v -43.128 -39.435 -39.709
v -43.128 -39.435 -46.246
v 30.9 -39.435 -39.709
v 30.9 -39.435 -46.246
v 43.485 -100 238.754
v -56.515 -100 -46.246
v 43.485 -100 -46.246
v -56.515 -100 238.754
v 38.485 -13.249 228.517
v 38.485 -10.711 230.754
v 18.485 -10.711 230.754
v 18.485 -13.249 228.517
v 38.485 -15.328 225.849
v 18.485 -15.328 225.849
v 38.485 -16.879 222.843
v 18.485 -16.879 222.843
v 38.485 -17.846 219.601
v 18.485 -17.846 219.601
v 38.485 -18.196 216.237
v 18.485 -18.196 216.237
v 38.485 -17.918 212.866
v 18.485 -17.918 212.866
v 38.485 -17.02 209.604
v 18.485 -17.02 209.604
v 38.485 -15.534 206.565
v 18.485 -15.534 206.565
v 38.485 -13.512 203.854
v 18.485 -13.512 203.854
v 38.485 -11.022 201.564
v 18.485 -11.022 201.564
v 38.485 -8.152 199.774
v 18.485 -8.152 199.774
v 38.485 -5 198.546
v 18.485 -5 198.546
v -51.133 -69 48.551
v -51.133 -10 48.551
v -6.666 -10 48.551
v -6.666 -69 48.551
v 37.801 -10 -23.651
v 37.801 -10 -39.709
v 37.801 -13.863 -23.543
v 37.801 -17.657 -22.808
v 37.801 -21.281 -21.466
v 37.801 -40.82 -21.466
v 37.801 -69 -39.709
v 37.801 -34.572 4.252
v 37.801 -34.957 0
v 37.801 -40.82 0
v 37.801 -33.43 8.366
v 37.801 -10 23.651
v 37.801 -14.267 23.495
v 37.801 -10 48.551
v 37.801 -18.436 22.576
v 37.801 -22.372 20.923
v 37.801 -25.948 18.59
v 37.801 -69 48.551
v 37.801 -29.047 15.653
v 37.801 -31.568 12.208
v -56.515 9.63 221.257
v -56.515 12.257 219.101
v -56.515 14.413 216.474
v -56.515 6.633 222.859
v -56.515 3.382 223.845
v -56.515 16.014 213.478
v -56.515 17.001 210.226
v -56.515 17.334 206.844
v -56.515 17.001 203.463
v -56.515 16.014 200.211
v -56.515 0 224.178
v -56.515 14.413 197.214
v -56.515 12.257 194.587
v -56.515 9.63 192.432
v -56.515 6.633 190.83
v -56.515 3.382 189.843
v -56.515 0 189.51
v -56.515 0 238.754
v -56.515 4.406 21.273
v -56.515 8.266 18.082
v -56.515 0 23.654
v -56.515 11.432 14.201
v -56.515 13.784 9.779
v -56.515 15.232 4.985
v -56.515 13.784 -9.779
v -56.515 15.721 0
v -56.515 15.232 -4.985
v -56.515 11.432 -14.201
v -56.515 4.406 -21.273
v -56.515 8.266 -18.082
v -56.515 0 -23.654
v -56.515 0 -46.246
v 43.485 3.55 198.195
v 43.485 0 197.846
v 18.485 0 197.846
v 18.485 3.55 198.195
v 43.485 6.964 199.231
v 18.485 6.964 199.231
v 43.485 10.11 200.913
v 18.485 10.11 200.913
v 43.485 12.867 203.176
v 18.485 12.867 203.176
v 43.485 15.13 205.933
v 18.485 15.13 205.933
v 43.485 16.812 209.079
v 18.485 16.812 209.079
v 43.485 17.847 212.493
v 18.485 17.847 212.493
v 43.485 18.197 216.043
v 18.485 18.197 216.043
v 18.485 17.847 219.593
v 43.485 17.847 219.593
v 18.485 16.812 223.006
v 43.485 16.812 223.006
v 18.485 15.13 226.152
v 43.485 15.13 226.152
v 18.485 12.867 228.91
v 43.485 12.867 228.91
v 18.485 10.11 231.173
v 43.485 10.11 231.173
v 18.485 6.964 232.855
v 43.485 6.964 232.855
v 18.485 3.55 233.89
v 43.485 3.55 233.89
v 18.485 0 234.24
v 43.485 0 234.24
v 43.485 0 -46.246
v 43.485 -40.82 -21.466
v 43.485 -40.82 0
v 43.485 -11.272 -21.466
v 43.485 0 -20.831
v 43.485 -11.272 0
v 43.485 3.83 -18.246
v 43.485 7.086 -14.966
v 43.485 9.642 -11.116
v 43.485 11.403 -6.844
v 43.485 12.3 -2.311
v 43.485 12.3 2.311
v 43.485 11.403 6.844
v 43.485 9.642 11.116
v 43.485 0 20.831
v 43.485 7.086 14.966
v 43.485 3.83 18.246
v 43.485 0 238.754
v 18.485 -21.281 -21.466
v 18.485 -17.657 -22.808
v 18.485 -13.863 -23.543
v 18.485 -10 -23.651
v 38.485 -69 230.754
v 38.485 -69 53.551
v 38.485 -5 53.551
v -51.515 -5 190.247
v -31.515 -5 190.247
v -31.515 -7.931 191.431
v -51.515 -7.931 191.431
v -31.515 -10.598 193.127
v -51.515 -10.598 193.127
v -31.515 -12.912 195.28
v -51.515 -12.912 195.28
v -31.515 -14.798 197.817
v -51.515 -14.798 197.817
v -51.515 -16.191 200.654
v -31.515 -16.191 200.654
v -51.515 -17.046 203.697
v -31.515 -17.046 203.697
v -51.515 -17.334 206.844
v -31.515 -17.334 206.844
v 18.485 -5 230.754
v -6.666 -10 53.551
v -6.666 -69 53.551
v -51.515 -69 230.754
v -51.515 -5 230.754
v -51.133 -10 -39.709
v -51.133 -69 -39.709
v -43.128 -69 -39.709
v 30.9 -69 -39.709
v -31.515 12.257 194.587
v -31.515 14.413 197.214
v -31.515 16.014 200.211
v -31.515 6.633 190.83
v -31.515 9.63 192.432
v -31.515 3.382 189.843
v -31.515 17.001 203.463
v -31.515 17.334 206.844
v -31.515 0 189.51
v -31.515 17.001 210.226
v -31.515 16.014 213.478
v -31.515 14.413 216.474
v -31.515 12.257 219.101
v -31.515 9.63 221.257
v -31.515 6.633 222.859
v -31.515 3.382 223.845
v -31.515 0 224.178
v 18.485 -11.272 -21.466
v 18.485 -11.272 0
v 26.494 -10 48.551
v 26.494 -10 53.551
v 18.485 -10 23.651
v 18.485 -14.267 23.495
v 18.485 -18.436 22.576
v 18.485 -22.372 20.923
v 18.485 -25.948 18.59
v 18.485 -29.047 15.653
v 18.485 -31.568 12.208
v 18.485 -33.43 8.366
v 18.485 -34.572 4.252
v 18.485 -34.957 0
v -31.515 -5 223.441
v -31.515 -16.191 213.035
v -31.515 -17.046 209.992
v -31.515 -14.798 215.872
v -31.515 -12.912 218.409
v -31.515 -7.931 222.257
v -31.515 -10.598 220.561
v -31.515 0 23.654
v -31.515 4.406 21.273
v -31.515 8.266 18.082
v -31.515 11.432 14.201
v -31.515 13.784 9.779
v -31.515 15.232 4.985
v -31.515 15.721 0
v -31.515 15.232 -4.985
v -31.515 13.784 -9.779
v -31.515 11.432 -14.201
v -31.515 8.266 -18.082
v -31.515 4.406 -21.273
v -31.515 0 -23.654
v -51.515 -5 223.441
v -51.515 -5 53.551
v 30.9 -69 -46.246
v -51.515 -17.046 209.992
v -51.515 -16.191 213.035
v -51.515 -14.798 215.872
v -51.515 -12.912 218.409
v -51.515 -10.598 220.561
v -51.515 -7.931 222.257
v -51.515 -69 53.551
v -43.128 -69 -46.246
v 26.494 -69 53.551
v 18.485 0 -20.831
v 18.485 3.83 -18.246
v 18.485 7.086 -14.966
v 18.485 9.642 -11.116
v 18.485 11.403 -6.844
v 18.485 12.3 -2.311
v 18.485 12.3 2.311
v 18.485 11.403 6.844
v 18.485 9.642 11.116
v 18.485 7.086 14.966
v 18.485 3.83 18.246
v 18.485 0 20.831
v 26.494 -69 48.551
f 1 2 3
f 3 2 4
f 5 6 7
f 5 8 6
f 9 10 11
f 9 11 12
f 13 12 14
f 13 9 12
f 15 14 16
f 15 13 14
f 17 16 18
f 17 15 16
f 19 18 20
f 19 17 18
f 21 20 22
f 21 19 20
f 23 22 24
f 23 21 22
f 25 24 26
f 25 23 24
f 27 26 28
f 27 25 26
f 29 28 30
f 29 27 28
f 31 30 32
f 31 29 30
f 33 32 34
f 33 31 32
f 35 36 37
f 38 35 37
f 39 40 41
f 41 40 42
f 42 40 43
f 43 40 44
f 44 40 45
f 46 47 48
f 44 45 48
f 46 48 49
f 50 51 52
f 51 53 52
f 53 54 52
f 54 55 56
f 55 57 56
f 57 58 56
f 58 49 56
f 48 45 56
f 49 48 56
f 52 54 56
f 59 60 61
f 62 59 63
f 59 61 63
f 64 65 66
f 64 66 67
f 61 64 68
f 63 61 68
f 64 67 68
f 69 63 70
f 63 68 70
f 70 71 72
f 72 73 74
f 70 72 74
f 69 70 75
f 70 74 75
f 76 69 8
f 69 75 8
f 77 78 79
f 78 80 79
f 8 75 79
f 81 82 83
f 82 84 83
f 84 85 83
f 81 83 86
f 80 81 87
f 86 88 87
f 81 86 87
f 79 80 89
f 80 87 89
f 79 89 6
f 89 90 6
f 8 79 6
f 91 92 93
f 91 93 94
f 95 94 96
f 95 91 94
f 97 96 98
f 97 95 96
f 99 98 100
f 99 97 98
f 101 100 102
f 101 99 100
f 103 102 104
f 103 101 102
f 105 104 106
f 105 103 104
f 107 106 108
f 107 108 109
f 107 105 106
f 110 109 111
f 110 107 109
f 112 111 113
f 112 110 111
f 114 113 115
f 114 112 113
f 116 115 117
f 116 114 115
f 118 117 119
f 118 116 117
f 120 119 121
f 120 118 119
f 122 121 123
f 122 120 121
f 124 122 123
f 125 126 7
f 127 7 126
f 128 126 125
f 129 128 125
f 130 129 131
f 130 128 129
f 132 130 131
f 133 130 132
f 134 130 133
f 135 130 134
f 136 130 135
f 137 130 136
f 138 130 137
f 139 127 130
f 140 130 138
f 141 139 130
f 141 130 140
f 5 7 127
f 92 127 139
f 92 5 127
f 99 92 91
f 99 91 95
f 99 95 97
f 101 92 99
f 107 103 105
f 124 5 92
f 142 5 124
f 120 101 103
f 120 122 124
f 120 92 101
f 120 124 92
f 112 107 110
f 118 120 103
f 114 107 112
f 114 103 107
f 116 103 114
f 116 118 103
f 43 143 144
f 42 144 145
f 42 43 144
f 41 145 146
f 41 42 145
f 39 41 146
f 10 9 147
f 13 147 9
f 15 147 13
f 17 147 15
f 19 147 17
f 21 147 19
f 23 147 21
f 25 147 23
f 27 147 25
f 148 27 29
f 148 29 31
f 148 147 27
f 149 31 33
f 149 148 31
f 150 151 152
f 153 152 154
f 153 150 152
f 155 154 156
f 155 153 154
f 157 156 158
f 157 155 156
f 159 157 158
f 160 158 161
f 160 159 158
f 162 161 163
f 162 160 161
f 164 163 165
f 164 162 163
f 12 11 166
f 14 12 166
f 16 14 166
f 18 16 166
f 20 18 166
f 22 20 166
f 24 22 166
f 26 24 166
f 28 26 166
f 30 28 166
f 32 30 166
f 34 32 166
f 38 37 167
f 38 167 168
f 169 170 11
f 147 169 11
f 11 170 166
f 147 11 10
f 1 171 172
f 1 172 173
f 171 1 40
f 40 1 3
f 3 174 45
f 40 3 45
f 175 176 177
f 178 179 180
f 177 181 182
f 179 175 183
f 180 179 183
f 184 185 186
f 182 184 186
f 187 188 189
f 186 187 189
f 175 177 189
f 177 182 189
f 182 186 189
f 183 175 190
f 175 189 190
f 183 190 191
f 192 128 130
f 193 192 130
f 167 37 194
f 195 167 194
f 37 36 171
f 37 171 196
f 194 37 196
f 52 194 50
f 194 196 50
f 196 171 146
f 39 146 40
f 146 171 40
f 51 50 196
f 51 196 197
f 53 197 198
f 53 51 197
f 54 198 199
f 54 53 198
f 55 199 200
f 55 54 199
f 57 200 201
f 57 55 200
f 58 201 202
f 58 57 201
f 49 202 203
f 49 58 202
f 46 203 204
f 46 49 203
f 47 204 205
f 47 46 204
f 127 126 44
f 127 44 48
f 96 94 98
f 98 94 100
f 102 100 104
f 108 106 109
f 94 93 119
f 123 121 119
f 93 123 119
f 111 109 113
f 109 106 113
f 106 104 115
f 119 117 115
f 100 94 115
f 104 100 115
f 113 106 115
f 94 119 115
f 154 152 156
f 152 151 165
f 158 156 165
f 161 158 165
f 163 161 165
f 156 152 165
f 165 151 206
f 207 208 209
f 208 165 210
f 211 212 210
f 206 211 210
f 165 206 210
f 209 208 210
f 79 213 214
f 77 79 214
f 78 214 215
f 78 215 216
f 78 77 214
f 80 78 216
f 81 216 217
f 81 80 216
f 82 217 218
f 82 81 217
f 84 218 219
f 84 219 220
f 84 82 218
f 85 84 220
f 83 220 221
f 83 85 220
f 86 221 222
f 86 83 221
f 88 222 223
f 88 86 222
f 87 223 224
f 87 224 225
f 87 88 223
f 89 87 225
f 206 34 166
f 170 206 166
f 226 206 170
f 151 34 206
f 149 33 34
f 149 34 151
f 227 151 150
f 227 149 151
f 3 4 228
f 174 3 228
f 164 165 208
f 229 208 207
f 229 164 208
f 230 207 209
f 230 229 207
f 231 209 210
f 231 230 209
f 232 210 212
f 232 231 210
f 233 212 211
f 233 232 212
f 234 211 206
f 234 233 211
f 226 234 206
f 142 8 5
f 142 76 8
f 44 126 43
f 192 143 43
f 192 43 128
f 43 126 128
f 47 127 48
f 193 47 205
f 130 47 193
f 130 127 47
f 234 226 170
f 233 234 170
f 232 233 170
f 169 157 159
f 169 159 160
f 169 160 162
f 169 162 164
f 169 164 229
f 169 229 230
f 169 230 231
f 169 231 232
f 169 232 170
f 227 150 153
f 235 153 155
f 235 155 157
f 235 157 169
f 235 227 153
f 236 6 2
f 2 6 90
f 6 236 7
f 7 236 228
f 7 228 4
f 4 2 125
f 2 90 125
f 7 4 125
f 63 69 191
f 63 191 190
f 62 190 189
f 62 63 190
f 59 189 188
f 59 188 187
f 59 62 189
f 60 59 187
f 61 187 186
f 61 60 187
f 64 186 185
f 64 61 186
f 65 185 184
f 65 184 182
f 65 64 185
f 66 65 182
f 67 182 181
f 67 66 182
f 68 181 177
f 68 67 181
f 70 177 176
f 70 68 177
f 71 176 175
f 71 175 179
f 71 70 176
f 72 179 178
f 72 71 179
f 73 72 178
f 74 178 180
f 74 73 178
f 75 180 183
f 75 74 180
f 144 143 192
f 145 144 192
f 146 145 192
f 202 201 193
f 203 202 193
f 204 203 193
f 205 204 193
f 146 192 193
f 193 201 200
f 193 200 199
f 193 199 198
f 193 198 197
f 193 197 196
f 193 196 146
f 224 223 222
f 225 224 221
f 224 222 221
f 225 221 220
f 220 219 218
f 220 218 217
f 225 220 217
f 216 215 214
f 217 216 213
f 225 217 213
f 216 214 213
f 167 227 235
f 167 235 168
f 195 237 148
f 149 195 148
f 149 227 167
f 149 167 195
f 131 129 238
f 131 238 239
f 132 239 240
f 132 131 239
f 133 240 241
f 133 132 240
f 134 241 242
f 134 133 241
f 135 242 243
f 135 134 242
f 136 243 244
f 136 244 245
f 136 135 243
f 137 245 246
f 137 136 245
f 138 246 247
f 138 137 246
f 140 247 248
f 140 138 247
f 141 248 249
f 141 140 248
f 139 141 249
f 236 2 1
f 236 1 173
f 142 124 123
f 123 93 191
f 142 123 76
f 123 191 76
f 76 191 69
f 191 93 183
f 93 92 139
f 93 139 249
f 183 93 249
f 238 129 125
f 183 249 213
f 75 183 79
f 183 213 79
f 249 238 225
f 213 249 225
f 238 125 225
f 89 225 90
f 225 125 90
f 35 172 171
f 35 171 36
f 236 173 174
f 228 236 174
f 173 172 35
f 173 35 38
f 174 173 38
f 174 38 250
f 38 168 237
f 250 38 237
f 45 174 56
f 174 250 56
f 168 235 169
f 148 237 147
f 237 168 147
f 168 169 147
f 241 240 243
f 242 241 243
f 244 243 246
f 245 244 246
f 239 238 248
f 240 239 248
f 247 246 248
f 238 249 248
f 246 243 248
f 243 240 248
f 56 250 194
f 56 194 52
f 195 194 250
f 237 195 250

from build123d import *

# Parameters (mm, degrees)
F0_W        = 100
F0_H        = 100
F1_DEPTH    = 100
F2_W        = 88.9338813722
F2_H        = 88.2601328194
F3_DEPTH    = 90
F5_DEPTH    = 185
F6_T        = 5
F6_T3_DEPTH = 100
F6_T5_DEPTH = 98.2601328194
F6_T7_DEPTH = 98.9338813722
F7_W        = 90
F7_H        = 95
F8_DEPTH    = 8
F10_DEPTH   = 25
F11_R       = 23.6849070482
F11_R_2     = 18.1970048193
F12_DEPTH   = 25
F13_W       = 74.0287862718
F13_H       = 40.3192453086
F14_DEPTH   = 9
F15_W       = 33.1602711231
F15_H       = 63.8056004047
F16_DEPTH   = 25
F17_W       = 95
F17_H       = 277
F18_DEPTH   = 31
F19_W       = 29.5484475791
F19_H       = 21.4659199119
F20_DEPTH   = 25


# Not quite as in the source:
# - a shell that OpenCascade refuses in one call is made with other operations: the cavity is built on its own and cut out


with BuildPart() as f1:
    # F0 (on Front) → F1 (new body)
    with BuildSketch(Plane.XZ):
        with Locations((-6.5152887255, 3.7536189136)):
            Rectangle(F0_W, F0_H)
    extrude(amount=F1_DEPTH)

    # F2 (on face) → F3 (cut)
    with BuildSketch(Plane.XZ.offset(100)):
        with Locations((-6.6661592573, 4.4211242348)):
            Rectangle(F2_W, F2_H)
    extrude(amount=-F3_DEPTH, mode=Mode.SUBTRACT)

    # F4 (on face) → F5 (join)
    with BuildSketch(Plane.XY.offset(53.7536189136)):
        Polygon((-56.5152887255, -100), (43.4847112745, -100), (43.4847112745, -33.4126986563), (43.4847112745, 0), (-56.5152887255, 0), align=None)
    extrude(amount=F5_DEPTH)

    # F6: shell of thickness 5, made by hand


with BuildPart() as f6_core1:
    # F6_t2: copy of F1
    add(f1.part)

    # the walls: a layer under each face that stays
    f6_faces = [f6_core1.faces().sort_by_distance(p)[0] for p in [
        (43.4847112745, -50, 96.2536189136),
        (-6.5152887255, 0, 96.2536189136),
        (-56.5152887255, -50, 96.2536189136),
        (-51.1330999434, -55, 4.4211242348),
        (-6.6661592573, -10, 4.4211242348),
        (-6.6661592573, -55, -39.7089421749),
        (37.8007814288, -55, 4.4211242348),
        (-6.6661592573, -55, 48.5511906445),
        (-6.5152887255, -50, -46.2463810864),
    ]]
    thicken(f6_faces, amount=-F6_T, mode=Mode.SUBTRACT)

    # F6_s4 → F6_t3 (cut)
    with BuildSketch(Plane.XZ.offset(5)):
        Polygon((-51.0830999434, 48.5011906445), (-56.1330999434, 48.5511906445), (-56.1330999434, 53.5511906445), (-51.1330999434, 53.5511906445), align=None)
        Polygon((-51.0830999434, -39.6589421749), (-56.1330999434, -39.7089421749), (-56.1330999434, -44.7089421749), (-51.1330999434, -44.7089421749), align=None)
        Polygon((37.7507814288, -39.6589421749), (37.8007814288, -44.7089421749), (42.8007814288, -44.7089421749), (42.8007814288, -39.7089421749), align=None)
        Polygon((37.7507814288, 48.5011906445), (42.8007814288, 48.5511906445), (42.8007814288, 53.5511906445), (37.8007814288, 53.5511906445), align=None)
    extrude(amount=F6_T3_DEPTH, mode=Mode.SUBTRACT)

    # F6_s6 → F6_t5 (cut)
    with BuildSketch(Plane.XY.offset(-44.7089421749)):
        Polygon((-51.0830999434, -10.05), (-56.1330999434, -10), (-56.1330999434, -5), (-51.1330999434, -5), align=None)
        Polygon((37.7507814288, -10.05), (37.8007814288, -5), (42.8007814288, -5), (42.8007814288, -10), align=None)
    extrude(amount=F6_T5_DEPTH, mode=Mode.SUBTRACT)

    # F6_s8 → F6_t7 (cut)
    with BuildSketch(Plane.YZ.offset(-56.1330999434)):
        Polygon((-10.05, 48.5011906445), (-5, 48.5511906445), (-5, 53.5511906445), (-10, 53.5511906445), align=None)
        Polygon((-10.05, -39.6589421749), (-5, -39.7089421749), (-5, -44.7089421749), (-10, -44.7089421749), align=None)
    extrude(amount=F6_T7_DEPTH, mode=Mode.SUBTRACT)


with BuildPart() as f1_1:
    add(f1.part)

    # what is left inside the walls is the cavity
    f6_cavity = [f6_core1.part.solids().sort_by_distance(p)[0] for p in [
        (38.434711, -68.333333, 146.152405),
    ]]
    add(f6_cavity, mode=Mode.SUBTRACT)

    # F7 (on face) → F8 (join)
    with BuildSketch(Plane.XY.offset(238.7536189136)):
        with Locations((-6.5152887255, -52.5)):
            Rectangle(F7_W, F7_H)
    extrude(amount=-F8_DEPTH)

    # F9 (on face) → F10 (join)
    with BuildSketch(Plane(origin=(-56.5152887255, 0, 0), x_dir=(0, -1, 0), z_dir=(-1, 0, 0))):
        with BuildLine():
            ThreePointArc((0, 189.510354193), (12.2569085004, 194.5873319266), (17.333886234, 206.844240427))
            ThreePointArc((17.333886234, 206.844240427), (12.2569085004, 219.1011489274), (0, 224.178126661))
            Line((0, 224.178126661), (0, 189.510354193))
        make_face()
        with BuildLine():
            Line((0, 189.510354193), (0, 224.178126661))
            ThreePointArc((0, 224.178126661), (-17.333886234, 206.844240427), (0, 189.510354193))
        make_face()
        with BuildLine():
            Line((0, -23.6541135693), (0, 23.6541135693))
            ThreePointArc((0, 23.6541135693), (-15.7209434523, 0), (0, -23.6541135693))
        make_face()
    extrude(amount=-F10_DEPTH)

    # F11 (on face) → F12 (join)
    with BuildSketch(Plane.YZ.offset(43.4847112745)):
        with Locations((-11.2718828022, 0)):
            Circle(F11_R)
        with Locations((0, 216.0427719355)):
            Circle(F11_R_2)
    extrude(amount=-F12_DEPTH)

    # F13 (on face) → F14 (cut)
    with BuildSketch(Plane(origin=(0, 0, -46.2463810864), x_dir=(1, 0, 0), z_dir=(0, 0, -1))):
        with Locations((-6.1139781028, 59.594200924)):
            Rectangle(F13_W, F13_H)
    extrude(amount=-F14_DEPTH, mode=Mode.SUBTRACT)

    # F15 (on face) → F16 (cut)
    with BuildSketch(Plane(origin=(0, 0, 48.5511906445), x_dir=(1, 0, 0), z_dir=(0, 0, -1))):
        with Locations((9.9139763042, 41.9028002024)):
            Rectangle(F15_W, F15_H)
    extrude(amount=-F16_DEPTH, mode=Mode.SUBTRACT)

    # F17 (on face) → F18 (join)
    with BuildSketch(Plane.XZ.offset(100)):
        with Locations((-9.0152887255, 92.2536189136)):
            Rectangle(F17_W, F17_H)
    extrude(amount=-F18_DEPTH)

    # F19 (on face) → F20 (cut)
    with BuildSketch(Plane.YZ.offset(43.4847112745)):
        with Locations((-26.0461065918, -10.7329599559)):
            Rectangle(F19_W, F19_H)
    extrude(amount=-F20_DEPTH, mode=Mode.SUBTRACT)


solid = f1_1.part
